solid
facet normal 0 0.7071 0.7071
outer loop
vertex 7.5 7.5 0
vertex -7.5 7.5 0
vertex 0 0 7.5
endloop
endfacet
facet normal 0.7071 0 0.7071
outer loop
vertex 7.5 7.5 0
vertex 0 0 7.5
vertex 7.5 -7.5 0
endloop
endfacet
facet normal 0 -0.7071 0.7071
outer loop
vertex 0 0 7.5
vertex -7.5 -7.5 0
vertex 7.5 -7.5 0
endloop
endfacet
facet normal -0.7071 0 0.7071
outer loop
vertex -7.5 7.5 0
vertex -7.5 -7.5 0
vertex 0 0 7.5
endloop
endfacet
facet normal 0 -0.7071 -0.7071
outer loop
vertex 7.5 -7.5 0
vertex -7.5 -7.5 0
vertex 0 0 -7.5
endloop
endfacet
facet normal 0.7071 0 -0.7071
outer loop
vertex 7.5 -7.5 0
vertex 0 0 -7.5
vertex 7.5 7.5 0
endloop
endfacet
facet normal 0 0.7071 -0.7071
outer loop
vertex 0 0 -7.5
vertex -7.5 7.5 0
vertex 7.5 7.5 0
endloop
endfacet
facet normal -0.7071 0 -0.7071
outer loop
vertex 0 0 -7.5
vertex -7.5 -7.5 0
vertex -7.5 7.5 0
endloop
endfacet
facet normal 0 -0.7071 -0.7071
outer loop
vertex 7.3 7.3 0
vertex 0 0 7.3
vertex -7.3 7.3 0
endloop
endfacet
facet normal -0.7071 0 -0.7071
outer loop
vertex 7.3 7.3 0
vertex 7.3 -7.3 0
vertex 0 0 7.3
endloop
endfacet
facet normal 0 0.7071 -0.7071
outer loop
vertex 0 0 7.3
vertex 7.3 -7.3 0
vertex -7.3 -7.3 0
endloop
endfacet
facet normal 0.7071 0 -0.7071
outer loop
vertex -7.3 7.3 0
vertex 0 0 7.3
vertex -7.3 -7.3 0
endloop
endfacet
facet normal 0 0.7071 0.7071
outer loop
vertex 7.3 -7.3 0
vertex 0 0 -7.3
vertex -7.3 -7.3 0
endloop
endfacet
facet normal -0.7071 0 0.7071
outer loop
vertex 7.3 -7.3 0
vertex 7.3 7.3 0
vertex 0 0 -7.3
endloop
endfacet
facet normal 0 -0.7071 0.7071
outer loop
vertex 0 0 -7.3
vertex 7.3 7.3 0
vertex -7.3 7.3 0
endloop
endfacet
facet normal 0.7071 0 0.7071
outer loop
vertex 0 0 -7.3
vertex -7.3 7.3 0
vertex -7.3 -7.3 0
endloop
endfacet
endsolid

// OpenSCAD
// sphere(r=3,$fn=6);

// difference() {
// 	sphere(r=4,$fn=8);
// 	sphere(r=3.6,$fn=8);
// }

// module triangle_pyramid(radius)
// {
//   o=radius/2;		//equivalent to radius*sin(30)
//   a=radius*sqrt(3)/2;	//equivalent to radius*cos(30)
//   polyhedron(points=[[-a,-o,-o],[a,-o,-o],[0,radius,-o],[0,0,radius]],triangles=[[0,1,2],[1,2,3],[0,1,3],[0,2,3]]);
// }

module square_pyramid(base_x, base_y,height)
{
  w=base_x/2;
  h=base_y/2;
  polyhedron(points=[[-w,-h,0],[-w,h,0],[w,h,0],[w,-h,0],[0,0,height]],triangles=[[0,3,2,1], [0,1,4], [1,2,4], [2,3,4], [3,0,4]]);
}

module double_pyramid(len=10) {
	square_pyramid(len,len,len/2);
	rotate([180,0,0])
		square_pyramid(len,len,len/2);
}


difference() {
	double_pyramid(15);	
	double_pyramid(14.6);
}
